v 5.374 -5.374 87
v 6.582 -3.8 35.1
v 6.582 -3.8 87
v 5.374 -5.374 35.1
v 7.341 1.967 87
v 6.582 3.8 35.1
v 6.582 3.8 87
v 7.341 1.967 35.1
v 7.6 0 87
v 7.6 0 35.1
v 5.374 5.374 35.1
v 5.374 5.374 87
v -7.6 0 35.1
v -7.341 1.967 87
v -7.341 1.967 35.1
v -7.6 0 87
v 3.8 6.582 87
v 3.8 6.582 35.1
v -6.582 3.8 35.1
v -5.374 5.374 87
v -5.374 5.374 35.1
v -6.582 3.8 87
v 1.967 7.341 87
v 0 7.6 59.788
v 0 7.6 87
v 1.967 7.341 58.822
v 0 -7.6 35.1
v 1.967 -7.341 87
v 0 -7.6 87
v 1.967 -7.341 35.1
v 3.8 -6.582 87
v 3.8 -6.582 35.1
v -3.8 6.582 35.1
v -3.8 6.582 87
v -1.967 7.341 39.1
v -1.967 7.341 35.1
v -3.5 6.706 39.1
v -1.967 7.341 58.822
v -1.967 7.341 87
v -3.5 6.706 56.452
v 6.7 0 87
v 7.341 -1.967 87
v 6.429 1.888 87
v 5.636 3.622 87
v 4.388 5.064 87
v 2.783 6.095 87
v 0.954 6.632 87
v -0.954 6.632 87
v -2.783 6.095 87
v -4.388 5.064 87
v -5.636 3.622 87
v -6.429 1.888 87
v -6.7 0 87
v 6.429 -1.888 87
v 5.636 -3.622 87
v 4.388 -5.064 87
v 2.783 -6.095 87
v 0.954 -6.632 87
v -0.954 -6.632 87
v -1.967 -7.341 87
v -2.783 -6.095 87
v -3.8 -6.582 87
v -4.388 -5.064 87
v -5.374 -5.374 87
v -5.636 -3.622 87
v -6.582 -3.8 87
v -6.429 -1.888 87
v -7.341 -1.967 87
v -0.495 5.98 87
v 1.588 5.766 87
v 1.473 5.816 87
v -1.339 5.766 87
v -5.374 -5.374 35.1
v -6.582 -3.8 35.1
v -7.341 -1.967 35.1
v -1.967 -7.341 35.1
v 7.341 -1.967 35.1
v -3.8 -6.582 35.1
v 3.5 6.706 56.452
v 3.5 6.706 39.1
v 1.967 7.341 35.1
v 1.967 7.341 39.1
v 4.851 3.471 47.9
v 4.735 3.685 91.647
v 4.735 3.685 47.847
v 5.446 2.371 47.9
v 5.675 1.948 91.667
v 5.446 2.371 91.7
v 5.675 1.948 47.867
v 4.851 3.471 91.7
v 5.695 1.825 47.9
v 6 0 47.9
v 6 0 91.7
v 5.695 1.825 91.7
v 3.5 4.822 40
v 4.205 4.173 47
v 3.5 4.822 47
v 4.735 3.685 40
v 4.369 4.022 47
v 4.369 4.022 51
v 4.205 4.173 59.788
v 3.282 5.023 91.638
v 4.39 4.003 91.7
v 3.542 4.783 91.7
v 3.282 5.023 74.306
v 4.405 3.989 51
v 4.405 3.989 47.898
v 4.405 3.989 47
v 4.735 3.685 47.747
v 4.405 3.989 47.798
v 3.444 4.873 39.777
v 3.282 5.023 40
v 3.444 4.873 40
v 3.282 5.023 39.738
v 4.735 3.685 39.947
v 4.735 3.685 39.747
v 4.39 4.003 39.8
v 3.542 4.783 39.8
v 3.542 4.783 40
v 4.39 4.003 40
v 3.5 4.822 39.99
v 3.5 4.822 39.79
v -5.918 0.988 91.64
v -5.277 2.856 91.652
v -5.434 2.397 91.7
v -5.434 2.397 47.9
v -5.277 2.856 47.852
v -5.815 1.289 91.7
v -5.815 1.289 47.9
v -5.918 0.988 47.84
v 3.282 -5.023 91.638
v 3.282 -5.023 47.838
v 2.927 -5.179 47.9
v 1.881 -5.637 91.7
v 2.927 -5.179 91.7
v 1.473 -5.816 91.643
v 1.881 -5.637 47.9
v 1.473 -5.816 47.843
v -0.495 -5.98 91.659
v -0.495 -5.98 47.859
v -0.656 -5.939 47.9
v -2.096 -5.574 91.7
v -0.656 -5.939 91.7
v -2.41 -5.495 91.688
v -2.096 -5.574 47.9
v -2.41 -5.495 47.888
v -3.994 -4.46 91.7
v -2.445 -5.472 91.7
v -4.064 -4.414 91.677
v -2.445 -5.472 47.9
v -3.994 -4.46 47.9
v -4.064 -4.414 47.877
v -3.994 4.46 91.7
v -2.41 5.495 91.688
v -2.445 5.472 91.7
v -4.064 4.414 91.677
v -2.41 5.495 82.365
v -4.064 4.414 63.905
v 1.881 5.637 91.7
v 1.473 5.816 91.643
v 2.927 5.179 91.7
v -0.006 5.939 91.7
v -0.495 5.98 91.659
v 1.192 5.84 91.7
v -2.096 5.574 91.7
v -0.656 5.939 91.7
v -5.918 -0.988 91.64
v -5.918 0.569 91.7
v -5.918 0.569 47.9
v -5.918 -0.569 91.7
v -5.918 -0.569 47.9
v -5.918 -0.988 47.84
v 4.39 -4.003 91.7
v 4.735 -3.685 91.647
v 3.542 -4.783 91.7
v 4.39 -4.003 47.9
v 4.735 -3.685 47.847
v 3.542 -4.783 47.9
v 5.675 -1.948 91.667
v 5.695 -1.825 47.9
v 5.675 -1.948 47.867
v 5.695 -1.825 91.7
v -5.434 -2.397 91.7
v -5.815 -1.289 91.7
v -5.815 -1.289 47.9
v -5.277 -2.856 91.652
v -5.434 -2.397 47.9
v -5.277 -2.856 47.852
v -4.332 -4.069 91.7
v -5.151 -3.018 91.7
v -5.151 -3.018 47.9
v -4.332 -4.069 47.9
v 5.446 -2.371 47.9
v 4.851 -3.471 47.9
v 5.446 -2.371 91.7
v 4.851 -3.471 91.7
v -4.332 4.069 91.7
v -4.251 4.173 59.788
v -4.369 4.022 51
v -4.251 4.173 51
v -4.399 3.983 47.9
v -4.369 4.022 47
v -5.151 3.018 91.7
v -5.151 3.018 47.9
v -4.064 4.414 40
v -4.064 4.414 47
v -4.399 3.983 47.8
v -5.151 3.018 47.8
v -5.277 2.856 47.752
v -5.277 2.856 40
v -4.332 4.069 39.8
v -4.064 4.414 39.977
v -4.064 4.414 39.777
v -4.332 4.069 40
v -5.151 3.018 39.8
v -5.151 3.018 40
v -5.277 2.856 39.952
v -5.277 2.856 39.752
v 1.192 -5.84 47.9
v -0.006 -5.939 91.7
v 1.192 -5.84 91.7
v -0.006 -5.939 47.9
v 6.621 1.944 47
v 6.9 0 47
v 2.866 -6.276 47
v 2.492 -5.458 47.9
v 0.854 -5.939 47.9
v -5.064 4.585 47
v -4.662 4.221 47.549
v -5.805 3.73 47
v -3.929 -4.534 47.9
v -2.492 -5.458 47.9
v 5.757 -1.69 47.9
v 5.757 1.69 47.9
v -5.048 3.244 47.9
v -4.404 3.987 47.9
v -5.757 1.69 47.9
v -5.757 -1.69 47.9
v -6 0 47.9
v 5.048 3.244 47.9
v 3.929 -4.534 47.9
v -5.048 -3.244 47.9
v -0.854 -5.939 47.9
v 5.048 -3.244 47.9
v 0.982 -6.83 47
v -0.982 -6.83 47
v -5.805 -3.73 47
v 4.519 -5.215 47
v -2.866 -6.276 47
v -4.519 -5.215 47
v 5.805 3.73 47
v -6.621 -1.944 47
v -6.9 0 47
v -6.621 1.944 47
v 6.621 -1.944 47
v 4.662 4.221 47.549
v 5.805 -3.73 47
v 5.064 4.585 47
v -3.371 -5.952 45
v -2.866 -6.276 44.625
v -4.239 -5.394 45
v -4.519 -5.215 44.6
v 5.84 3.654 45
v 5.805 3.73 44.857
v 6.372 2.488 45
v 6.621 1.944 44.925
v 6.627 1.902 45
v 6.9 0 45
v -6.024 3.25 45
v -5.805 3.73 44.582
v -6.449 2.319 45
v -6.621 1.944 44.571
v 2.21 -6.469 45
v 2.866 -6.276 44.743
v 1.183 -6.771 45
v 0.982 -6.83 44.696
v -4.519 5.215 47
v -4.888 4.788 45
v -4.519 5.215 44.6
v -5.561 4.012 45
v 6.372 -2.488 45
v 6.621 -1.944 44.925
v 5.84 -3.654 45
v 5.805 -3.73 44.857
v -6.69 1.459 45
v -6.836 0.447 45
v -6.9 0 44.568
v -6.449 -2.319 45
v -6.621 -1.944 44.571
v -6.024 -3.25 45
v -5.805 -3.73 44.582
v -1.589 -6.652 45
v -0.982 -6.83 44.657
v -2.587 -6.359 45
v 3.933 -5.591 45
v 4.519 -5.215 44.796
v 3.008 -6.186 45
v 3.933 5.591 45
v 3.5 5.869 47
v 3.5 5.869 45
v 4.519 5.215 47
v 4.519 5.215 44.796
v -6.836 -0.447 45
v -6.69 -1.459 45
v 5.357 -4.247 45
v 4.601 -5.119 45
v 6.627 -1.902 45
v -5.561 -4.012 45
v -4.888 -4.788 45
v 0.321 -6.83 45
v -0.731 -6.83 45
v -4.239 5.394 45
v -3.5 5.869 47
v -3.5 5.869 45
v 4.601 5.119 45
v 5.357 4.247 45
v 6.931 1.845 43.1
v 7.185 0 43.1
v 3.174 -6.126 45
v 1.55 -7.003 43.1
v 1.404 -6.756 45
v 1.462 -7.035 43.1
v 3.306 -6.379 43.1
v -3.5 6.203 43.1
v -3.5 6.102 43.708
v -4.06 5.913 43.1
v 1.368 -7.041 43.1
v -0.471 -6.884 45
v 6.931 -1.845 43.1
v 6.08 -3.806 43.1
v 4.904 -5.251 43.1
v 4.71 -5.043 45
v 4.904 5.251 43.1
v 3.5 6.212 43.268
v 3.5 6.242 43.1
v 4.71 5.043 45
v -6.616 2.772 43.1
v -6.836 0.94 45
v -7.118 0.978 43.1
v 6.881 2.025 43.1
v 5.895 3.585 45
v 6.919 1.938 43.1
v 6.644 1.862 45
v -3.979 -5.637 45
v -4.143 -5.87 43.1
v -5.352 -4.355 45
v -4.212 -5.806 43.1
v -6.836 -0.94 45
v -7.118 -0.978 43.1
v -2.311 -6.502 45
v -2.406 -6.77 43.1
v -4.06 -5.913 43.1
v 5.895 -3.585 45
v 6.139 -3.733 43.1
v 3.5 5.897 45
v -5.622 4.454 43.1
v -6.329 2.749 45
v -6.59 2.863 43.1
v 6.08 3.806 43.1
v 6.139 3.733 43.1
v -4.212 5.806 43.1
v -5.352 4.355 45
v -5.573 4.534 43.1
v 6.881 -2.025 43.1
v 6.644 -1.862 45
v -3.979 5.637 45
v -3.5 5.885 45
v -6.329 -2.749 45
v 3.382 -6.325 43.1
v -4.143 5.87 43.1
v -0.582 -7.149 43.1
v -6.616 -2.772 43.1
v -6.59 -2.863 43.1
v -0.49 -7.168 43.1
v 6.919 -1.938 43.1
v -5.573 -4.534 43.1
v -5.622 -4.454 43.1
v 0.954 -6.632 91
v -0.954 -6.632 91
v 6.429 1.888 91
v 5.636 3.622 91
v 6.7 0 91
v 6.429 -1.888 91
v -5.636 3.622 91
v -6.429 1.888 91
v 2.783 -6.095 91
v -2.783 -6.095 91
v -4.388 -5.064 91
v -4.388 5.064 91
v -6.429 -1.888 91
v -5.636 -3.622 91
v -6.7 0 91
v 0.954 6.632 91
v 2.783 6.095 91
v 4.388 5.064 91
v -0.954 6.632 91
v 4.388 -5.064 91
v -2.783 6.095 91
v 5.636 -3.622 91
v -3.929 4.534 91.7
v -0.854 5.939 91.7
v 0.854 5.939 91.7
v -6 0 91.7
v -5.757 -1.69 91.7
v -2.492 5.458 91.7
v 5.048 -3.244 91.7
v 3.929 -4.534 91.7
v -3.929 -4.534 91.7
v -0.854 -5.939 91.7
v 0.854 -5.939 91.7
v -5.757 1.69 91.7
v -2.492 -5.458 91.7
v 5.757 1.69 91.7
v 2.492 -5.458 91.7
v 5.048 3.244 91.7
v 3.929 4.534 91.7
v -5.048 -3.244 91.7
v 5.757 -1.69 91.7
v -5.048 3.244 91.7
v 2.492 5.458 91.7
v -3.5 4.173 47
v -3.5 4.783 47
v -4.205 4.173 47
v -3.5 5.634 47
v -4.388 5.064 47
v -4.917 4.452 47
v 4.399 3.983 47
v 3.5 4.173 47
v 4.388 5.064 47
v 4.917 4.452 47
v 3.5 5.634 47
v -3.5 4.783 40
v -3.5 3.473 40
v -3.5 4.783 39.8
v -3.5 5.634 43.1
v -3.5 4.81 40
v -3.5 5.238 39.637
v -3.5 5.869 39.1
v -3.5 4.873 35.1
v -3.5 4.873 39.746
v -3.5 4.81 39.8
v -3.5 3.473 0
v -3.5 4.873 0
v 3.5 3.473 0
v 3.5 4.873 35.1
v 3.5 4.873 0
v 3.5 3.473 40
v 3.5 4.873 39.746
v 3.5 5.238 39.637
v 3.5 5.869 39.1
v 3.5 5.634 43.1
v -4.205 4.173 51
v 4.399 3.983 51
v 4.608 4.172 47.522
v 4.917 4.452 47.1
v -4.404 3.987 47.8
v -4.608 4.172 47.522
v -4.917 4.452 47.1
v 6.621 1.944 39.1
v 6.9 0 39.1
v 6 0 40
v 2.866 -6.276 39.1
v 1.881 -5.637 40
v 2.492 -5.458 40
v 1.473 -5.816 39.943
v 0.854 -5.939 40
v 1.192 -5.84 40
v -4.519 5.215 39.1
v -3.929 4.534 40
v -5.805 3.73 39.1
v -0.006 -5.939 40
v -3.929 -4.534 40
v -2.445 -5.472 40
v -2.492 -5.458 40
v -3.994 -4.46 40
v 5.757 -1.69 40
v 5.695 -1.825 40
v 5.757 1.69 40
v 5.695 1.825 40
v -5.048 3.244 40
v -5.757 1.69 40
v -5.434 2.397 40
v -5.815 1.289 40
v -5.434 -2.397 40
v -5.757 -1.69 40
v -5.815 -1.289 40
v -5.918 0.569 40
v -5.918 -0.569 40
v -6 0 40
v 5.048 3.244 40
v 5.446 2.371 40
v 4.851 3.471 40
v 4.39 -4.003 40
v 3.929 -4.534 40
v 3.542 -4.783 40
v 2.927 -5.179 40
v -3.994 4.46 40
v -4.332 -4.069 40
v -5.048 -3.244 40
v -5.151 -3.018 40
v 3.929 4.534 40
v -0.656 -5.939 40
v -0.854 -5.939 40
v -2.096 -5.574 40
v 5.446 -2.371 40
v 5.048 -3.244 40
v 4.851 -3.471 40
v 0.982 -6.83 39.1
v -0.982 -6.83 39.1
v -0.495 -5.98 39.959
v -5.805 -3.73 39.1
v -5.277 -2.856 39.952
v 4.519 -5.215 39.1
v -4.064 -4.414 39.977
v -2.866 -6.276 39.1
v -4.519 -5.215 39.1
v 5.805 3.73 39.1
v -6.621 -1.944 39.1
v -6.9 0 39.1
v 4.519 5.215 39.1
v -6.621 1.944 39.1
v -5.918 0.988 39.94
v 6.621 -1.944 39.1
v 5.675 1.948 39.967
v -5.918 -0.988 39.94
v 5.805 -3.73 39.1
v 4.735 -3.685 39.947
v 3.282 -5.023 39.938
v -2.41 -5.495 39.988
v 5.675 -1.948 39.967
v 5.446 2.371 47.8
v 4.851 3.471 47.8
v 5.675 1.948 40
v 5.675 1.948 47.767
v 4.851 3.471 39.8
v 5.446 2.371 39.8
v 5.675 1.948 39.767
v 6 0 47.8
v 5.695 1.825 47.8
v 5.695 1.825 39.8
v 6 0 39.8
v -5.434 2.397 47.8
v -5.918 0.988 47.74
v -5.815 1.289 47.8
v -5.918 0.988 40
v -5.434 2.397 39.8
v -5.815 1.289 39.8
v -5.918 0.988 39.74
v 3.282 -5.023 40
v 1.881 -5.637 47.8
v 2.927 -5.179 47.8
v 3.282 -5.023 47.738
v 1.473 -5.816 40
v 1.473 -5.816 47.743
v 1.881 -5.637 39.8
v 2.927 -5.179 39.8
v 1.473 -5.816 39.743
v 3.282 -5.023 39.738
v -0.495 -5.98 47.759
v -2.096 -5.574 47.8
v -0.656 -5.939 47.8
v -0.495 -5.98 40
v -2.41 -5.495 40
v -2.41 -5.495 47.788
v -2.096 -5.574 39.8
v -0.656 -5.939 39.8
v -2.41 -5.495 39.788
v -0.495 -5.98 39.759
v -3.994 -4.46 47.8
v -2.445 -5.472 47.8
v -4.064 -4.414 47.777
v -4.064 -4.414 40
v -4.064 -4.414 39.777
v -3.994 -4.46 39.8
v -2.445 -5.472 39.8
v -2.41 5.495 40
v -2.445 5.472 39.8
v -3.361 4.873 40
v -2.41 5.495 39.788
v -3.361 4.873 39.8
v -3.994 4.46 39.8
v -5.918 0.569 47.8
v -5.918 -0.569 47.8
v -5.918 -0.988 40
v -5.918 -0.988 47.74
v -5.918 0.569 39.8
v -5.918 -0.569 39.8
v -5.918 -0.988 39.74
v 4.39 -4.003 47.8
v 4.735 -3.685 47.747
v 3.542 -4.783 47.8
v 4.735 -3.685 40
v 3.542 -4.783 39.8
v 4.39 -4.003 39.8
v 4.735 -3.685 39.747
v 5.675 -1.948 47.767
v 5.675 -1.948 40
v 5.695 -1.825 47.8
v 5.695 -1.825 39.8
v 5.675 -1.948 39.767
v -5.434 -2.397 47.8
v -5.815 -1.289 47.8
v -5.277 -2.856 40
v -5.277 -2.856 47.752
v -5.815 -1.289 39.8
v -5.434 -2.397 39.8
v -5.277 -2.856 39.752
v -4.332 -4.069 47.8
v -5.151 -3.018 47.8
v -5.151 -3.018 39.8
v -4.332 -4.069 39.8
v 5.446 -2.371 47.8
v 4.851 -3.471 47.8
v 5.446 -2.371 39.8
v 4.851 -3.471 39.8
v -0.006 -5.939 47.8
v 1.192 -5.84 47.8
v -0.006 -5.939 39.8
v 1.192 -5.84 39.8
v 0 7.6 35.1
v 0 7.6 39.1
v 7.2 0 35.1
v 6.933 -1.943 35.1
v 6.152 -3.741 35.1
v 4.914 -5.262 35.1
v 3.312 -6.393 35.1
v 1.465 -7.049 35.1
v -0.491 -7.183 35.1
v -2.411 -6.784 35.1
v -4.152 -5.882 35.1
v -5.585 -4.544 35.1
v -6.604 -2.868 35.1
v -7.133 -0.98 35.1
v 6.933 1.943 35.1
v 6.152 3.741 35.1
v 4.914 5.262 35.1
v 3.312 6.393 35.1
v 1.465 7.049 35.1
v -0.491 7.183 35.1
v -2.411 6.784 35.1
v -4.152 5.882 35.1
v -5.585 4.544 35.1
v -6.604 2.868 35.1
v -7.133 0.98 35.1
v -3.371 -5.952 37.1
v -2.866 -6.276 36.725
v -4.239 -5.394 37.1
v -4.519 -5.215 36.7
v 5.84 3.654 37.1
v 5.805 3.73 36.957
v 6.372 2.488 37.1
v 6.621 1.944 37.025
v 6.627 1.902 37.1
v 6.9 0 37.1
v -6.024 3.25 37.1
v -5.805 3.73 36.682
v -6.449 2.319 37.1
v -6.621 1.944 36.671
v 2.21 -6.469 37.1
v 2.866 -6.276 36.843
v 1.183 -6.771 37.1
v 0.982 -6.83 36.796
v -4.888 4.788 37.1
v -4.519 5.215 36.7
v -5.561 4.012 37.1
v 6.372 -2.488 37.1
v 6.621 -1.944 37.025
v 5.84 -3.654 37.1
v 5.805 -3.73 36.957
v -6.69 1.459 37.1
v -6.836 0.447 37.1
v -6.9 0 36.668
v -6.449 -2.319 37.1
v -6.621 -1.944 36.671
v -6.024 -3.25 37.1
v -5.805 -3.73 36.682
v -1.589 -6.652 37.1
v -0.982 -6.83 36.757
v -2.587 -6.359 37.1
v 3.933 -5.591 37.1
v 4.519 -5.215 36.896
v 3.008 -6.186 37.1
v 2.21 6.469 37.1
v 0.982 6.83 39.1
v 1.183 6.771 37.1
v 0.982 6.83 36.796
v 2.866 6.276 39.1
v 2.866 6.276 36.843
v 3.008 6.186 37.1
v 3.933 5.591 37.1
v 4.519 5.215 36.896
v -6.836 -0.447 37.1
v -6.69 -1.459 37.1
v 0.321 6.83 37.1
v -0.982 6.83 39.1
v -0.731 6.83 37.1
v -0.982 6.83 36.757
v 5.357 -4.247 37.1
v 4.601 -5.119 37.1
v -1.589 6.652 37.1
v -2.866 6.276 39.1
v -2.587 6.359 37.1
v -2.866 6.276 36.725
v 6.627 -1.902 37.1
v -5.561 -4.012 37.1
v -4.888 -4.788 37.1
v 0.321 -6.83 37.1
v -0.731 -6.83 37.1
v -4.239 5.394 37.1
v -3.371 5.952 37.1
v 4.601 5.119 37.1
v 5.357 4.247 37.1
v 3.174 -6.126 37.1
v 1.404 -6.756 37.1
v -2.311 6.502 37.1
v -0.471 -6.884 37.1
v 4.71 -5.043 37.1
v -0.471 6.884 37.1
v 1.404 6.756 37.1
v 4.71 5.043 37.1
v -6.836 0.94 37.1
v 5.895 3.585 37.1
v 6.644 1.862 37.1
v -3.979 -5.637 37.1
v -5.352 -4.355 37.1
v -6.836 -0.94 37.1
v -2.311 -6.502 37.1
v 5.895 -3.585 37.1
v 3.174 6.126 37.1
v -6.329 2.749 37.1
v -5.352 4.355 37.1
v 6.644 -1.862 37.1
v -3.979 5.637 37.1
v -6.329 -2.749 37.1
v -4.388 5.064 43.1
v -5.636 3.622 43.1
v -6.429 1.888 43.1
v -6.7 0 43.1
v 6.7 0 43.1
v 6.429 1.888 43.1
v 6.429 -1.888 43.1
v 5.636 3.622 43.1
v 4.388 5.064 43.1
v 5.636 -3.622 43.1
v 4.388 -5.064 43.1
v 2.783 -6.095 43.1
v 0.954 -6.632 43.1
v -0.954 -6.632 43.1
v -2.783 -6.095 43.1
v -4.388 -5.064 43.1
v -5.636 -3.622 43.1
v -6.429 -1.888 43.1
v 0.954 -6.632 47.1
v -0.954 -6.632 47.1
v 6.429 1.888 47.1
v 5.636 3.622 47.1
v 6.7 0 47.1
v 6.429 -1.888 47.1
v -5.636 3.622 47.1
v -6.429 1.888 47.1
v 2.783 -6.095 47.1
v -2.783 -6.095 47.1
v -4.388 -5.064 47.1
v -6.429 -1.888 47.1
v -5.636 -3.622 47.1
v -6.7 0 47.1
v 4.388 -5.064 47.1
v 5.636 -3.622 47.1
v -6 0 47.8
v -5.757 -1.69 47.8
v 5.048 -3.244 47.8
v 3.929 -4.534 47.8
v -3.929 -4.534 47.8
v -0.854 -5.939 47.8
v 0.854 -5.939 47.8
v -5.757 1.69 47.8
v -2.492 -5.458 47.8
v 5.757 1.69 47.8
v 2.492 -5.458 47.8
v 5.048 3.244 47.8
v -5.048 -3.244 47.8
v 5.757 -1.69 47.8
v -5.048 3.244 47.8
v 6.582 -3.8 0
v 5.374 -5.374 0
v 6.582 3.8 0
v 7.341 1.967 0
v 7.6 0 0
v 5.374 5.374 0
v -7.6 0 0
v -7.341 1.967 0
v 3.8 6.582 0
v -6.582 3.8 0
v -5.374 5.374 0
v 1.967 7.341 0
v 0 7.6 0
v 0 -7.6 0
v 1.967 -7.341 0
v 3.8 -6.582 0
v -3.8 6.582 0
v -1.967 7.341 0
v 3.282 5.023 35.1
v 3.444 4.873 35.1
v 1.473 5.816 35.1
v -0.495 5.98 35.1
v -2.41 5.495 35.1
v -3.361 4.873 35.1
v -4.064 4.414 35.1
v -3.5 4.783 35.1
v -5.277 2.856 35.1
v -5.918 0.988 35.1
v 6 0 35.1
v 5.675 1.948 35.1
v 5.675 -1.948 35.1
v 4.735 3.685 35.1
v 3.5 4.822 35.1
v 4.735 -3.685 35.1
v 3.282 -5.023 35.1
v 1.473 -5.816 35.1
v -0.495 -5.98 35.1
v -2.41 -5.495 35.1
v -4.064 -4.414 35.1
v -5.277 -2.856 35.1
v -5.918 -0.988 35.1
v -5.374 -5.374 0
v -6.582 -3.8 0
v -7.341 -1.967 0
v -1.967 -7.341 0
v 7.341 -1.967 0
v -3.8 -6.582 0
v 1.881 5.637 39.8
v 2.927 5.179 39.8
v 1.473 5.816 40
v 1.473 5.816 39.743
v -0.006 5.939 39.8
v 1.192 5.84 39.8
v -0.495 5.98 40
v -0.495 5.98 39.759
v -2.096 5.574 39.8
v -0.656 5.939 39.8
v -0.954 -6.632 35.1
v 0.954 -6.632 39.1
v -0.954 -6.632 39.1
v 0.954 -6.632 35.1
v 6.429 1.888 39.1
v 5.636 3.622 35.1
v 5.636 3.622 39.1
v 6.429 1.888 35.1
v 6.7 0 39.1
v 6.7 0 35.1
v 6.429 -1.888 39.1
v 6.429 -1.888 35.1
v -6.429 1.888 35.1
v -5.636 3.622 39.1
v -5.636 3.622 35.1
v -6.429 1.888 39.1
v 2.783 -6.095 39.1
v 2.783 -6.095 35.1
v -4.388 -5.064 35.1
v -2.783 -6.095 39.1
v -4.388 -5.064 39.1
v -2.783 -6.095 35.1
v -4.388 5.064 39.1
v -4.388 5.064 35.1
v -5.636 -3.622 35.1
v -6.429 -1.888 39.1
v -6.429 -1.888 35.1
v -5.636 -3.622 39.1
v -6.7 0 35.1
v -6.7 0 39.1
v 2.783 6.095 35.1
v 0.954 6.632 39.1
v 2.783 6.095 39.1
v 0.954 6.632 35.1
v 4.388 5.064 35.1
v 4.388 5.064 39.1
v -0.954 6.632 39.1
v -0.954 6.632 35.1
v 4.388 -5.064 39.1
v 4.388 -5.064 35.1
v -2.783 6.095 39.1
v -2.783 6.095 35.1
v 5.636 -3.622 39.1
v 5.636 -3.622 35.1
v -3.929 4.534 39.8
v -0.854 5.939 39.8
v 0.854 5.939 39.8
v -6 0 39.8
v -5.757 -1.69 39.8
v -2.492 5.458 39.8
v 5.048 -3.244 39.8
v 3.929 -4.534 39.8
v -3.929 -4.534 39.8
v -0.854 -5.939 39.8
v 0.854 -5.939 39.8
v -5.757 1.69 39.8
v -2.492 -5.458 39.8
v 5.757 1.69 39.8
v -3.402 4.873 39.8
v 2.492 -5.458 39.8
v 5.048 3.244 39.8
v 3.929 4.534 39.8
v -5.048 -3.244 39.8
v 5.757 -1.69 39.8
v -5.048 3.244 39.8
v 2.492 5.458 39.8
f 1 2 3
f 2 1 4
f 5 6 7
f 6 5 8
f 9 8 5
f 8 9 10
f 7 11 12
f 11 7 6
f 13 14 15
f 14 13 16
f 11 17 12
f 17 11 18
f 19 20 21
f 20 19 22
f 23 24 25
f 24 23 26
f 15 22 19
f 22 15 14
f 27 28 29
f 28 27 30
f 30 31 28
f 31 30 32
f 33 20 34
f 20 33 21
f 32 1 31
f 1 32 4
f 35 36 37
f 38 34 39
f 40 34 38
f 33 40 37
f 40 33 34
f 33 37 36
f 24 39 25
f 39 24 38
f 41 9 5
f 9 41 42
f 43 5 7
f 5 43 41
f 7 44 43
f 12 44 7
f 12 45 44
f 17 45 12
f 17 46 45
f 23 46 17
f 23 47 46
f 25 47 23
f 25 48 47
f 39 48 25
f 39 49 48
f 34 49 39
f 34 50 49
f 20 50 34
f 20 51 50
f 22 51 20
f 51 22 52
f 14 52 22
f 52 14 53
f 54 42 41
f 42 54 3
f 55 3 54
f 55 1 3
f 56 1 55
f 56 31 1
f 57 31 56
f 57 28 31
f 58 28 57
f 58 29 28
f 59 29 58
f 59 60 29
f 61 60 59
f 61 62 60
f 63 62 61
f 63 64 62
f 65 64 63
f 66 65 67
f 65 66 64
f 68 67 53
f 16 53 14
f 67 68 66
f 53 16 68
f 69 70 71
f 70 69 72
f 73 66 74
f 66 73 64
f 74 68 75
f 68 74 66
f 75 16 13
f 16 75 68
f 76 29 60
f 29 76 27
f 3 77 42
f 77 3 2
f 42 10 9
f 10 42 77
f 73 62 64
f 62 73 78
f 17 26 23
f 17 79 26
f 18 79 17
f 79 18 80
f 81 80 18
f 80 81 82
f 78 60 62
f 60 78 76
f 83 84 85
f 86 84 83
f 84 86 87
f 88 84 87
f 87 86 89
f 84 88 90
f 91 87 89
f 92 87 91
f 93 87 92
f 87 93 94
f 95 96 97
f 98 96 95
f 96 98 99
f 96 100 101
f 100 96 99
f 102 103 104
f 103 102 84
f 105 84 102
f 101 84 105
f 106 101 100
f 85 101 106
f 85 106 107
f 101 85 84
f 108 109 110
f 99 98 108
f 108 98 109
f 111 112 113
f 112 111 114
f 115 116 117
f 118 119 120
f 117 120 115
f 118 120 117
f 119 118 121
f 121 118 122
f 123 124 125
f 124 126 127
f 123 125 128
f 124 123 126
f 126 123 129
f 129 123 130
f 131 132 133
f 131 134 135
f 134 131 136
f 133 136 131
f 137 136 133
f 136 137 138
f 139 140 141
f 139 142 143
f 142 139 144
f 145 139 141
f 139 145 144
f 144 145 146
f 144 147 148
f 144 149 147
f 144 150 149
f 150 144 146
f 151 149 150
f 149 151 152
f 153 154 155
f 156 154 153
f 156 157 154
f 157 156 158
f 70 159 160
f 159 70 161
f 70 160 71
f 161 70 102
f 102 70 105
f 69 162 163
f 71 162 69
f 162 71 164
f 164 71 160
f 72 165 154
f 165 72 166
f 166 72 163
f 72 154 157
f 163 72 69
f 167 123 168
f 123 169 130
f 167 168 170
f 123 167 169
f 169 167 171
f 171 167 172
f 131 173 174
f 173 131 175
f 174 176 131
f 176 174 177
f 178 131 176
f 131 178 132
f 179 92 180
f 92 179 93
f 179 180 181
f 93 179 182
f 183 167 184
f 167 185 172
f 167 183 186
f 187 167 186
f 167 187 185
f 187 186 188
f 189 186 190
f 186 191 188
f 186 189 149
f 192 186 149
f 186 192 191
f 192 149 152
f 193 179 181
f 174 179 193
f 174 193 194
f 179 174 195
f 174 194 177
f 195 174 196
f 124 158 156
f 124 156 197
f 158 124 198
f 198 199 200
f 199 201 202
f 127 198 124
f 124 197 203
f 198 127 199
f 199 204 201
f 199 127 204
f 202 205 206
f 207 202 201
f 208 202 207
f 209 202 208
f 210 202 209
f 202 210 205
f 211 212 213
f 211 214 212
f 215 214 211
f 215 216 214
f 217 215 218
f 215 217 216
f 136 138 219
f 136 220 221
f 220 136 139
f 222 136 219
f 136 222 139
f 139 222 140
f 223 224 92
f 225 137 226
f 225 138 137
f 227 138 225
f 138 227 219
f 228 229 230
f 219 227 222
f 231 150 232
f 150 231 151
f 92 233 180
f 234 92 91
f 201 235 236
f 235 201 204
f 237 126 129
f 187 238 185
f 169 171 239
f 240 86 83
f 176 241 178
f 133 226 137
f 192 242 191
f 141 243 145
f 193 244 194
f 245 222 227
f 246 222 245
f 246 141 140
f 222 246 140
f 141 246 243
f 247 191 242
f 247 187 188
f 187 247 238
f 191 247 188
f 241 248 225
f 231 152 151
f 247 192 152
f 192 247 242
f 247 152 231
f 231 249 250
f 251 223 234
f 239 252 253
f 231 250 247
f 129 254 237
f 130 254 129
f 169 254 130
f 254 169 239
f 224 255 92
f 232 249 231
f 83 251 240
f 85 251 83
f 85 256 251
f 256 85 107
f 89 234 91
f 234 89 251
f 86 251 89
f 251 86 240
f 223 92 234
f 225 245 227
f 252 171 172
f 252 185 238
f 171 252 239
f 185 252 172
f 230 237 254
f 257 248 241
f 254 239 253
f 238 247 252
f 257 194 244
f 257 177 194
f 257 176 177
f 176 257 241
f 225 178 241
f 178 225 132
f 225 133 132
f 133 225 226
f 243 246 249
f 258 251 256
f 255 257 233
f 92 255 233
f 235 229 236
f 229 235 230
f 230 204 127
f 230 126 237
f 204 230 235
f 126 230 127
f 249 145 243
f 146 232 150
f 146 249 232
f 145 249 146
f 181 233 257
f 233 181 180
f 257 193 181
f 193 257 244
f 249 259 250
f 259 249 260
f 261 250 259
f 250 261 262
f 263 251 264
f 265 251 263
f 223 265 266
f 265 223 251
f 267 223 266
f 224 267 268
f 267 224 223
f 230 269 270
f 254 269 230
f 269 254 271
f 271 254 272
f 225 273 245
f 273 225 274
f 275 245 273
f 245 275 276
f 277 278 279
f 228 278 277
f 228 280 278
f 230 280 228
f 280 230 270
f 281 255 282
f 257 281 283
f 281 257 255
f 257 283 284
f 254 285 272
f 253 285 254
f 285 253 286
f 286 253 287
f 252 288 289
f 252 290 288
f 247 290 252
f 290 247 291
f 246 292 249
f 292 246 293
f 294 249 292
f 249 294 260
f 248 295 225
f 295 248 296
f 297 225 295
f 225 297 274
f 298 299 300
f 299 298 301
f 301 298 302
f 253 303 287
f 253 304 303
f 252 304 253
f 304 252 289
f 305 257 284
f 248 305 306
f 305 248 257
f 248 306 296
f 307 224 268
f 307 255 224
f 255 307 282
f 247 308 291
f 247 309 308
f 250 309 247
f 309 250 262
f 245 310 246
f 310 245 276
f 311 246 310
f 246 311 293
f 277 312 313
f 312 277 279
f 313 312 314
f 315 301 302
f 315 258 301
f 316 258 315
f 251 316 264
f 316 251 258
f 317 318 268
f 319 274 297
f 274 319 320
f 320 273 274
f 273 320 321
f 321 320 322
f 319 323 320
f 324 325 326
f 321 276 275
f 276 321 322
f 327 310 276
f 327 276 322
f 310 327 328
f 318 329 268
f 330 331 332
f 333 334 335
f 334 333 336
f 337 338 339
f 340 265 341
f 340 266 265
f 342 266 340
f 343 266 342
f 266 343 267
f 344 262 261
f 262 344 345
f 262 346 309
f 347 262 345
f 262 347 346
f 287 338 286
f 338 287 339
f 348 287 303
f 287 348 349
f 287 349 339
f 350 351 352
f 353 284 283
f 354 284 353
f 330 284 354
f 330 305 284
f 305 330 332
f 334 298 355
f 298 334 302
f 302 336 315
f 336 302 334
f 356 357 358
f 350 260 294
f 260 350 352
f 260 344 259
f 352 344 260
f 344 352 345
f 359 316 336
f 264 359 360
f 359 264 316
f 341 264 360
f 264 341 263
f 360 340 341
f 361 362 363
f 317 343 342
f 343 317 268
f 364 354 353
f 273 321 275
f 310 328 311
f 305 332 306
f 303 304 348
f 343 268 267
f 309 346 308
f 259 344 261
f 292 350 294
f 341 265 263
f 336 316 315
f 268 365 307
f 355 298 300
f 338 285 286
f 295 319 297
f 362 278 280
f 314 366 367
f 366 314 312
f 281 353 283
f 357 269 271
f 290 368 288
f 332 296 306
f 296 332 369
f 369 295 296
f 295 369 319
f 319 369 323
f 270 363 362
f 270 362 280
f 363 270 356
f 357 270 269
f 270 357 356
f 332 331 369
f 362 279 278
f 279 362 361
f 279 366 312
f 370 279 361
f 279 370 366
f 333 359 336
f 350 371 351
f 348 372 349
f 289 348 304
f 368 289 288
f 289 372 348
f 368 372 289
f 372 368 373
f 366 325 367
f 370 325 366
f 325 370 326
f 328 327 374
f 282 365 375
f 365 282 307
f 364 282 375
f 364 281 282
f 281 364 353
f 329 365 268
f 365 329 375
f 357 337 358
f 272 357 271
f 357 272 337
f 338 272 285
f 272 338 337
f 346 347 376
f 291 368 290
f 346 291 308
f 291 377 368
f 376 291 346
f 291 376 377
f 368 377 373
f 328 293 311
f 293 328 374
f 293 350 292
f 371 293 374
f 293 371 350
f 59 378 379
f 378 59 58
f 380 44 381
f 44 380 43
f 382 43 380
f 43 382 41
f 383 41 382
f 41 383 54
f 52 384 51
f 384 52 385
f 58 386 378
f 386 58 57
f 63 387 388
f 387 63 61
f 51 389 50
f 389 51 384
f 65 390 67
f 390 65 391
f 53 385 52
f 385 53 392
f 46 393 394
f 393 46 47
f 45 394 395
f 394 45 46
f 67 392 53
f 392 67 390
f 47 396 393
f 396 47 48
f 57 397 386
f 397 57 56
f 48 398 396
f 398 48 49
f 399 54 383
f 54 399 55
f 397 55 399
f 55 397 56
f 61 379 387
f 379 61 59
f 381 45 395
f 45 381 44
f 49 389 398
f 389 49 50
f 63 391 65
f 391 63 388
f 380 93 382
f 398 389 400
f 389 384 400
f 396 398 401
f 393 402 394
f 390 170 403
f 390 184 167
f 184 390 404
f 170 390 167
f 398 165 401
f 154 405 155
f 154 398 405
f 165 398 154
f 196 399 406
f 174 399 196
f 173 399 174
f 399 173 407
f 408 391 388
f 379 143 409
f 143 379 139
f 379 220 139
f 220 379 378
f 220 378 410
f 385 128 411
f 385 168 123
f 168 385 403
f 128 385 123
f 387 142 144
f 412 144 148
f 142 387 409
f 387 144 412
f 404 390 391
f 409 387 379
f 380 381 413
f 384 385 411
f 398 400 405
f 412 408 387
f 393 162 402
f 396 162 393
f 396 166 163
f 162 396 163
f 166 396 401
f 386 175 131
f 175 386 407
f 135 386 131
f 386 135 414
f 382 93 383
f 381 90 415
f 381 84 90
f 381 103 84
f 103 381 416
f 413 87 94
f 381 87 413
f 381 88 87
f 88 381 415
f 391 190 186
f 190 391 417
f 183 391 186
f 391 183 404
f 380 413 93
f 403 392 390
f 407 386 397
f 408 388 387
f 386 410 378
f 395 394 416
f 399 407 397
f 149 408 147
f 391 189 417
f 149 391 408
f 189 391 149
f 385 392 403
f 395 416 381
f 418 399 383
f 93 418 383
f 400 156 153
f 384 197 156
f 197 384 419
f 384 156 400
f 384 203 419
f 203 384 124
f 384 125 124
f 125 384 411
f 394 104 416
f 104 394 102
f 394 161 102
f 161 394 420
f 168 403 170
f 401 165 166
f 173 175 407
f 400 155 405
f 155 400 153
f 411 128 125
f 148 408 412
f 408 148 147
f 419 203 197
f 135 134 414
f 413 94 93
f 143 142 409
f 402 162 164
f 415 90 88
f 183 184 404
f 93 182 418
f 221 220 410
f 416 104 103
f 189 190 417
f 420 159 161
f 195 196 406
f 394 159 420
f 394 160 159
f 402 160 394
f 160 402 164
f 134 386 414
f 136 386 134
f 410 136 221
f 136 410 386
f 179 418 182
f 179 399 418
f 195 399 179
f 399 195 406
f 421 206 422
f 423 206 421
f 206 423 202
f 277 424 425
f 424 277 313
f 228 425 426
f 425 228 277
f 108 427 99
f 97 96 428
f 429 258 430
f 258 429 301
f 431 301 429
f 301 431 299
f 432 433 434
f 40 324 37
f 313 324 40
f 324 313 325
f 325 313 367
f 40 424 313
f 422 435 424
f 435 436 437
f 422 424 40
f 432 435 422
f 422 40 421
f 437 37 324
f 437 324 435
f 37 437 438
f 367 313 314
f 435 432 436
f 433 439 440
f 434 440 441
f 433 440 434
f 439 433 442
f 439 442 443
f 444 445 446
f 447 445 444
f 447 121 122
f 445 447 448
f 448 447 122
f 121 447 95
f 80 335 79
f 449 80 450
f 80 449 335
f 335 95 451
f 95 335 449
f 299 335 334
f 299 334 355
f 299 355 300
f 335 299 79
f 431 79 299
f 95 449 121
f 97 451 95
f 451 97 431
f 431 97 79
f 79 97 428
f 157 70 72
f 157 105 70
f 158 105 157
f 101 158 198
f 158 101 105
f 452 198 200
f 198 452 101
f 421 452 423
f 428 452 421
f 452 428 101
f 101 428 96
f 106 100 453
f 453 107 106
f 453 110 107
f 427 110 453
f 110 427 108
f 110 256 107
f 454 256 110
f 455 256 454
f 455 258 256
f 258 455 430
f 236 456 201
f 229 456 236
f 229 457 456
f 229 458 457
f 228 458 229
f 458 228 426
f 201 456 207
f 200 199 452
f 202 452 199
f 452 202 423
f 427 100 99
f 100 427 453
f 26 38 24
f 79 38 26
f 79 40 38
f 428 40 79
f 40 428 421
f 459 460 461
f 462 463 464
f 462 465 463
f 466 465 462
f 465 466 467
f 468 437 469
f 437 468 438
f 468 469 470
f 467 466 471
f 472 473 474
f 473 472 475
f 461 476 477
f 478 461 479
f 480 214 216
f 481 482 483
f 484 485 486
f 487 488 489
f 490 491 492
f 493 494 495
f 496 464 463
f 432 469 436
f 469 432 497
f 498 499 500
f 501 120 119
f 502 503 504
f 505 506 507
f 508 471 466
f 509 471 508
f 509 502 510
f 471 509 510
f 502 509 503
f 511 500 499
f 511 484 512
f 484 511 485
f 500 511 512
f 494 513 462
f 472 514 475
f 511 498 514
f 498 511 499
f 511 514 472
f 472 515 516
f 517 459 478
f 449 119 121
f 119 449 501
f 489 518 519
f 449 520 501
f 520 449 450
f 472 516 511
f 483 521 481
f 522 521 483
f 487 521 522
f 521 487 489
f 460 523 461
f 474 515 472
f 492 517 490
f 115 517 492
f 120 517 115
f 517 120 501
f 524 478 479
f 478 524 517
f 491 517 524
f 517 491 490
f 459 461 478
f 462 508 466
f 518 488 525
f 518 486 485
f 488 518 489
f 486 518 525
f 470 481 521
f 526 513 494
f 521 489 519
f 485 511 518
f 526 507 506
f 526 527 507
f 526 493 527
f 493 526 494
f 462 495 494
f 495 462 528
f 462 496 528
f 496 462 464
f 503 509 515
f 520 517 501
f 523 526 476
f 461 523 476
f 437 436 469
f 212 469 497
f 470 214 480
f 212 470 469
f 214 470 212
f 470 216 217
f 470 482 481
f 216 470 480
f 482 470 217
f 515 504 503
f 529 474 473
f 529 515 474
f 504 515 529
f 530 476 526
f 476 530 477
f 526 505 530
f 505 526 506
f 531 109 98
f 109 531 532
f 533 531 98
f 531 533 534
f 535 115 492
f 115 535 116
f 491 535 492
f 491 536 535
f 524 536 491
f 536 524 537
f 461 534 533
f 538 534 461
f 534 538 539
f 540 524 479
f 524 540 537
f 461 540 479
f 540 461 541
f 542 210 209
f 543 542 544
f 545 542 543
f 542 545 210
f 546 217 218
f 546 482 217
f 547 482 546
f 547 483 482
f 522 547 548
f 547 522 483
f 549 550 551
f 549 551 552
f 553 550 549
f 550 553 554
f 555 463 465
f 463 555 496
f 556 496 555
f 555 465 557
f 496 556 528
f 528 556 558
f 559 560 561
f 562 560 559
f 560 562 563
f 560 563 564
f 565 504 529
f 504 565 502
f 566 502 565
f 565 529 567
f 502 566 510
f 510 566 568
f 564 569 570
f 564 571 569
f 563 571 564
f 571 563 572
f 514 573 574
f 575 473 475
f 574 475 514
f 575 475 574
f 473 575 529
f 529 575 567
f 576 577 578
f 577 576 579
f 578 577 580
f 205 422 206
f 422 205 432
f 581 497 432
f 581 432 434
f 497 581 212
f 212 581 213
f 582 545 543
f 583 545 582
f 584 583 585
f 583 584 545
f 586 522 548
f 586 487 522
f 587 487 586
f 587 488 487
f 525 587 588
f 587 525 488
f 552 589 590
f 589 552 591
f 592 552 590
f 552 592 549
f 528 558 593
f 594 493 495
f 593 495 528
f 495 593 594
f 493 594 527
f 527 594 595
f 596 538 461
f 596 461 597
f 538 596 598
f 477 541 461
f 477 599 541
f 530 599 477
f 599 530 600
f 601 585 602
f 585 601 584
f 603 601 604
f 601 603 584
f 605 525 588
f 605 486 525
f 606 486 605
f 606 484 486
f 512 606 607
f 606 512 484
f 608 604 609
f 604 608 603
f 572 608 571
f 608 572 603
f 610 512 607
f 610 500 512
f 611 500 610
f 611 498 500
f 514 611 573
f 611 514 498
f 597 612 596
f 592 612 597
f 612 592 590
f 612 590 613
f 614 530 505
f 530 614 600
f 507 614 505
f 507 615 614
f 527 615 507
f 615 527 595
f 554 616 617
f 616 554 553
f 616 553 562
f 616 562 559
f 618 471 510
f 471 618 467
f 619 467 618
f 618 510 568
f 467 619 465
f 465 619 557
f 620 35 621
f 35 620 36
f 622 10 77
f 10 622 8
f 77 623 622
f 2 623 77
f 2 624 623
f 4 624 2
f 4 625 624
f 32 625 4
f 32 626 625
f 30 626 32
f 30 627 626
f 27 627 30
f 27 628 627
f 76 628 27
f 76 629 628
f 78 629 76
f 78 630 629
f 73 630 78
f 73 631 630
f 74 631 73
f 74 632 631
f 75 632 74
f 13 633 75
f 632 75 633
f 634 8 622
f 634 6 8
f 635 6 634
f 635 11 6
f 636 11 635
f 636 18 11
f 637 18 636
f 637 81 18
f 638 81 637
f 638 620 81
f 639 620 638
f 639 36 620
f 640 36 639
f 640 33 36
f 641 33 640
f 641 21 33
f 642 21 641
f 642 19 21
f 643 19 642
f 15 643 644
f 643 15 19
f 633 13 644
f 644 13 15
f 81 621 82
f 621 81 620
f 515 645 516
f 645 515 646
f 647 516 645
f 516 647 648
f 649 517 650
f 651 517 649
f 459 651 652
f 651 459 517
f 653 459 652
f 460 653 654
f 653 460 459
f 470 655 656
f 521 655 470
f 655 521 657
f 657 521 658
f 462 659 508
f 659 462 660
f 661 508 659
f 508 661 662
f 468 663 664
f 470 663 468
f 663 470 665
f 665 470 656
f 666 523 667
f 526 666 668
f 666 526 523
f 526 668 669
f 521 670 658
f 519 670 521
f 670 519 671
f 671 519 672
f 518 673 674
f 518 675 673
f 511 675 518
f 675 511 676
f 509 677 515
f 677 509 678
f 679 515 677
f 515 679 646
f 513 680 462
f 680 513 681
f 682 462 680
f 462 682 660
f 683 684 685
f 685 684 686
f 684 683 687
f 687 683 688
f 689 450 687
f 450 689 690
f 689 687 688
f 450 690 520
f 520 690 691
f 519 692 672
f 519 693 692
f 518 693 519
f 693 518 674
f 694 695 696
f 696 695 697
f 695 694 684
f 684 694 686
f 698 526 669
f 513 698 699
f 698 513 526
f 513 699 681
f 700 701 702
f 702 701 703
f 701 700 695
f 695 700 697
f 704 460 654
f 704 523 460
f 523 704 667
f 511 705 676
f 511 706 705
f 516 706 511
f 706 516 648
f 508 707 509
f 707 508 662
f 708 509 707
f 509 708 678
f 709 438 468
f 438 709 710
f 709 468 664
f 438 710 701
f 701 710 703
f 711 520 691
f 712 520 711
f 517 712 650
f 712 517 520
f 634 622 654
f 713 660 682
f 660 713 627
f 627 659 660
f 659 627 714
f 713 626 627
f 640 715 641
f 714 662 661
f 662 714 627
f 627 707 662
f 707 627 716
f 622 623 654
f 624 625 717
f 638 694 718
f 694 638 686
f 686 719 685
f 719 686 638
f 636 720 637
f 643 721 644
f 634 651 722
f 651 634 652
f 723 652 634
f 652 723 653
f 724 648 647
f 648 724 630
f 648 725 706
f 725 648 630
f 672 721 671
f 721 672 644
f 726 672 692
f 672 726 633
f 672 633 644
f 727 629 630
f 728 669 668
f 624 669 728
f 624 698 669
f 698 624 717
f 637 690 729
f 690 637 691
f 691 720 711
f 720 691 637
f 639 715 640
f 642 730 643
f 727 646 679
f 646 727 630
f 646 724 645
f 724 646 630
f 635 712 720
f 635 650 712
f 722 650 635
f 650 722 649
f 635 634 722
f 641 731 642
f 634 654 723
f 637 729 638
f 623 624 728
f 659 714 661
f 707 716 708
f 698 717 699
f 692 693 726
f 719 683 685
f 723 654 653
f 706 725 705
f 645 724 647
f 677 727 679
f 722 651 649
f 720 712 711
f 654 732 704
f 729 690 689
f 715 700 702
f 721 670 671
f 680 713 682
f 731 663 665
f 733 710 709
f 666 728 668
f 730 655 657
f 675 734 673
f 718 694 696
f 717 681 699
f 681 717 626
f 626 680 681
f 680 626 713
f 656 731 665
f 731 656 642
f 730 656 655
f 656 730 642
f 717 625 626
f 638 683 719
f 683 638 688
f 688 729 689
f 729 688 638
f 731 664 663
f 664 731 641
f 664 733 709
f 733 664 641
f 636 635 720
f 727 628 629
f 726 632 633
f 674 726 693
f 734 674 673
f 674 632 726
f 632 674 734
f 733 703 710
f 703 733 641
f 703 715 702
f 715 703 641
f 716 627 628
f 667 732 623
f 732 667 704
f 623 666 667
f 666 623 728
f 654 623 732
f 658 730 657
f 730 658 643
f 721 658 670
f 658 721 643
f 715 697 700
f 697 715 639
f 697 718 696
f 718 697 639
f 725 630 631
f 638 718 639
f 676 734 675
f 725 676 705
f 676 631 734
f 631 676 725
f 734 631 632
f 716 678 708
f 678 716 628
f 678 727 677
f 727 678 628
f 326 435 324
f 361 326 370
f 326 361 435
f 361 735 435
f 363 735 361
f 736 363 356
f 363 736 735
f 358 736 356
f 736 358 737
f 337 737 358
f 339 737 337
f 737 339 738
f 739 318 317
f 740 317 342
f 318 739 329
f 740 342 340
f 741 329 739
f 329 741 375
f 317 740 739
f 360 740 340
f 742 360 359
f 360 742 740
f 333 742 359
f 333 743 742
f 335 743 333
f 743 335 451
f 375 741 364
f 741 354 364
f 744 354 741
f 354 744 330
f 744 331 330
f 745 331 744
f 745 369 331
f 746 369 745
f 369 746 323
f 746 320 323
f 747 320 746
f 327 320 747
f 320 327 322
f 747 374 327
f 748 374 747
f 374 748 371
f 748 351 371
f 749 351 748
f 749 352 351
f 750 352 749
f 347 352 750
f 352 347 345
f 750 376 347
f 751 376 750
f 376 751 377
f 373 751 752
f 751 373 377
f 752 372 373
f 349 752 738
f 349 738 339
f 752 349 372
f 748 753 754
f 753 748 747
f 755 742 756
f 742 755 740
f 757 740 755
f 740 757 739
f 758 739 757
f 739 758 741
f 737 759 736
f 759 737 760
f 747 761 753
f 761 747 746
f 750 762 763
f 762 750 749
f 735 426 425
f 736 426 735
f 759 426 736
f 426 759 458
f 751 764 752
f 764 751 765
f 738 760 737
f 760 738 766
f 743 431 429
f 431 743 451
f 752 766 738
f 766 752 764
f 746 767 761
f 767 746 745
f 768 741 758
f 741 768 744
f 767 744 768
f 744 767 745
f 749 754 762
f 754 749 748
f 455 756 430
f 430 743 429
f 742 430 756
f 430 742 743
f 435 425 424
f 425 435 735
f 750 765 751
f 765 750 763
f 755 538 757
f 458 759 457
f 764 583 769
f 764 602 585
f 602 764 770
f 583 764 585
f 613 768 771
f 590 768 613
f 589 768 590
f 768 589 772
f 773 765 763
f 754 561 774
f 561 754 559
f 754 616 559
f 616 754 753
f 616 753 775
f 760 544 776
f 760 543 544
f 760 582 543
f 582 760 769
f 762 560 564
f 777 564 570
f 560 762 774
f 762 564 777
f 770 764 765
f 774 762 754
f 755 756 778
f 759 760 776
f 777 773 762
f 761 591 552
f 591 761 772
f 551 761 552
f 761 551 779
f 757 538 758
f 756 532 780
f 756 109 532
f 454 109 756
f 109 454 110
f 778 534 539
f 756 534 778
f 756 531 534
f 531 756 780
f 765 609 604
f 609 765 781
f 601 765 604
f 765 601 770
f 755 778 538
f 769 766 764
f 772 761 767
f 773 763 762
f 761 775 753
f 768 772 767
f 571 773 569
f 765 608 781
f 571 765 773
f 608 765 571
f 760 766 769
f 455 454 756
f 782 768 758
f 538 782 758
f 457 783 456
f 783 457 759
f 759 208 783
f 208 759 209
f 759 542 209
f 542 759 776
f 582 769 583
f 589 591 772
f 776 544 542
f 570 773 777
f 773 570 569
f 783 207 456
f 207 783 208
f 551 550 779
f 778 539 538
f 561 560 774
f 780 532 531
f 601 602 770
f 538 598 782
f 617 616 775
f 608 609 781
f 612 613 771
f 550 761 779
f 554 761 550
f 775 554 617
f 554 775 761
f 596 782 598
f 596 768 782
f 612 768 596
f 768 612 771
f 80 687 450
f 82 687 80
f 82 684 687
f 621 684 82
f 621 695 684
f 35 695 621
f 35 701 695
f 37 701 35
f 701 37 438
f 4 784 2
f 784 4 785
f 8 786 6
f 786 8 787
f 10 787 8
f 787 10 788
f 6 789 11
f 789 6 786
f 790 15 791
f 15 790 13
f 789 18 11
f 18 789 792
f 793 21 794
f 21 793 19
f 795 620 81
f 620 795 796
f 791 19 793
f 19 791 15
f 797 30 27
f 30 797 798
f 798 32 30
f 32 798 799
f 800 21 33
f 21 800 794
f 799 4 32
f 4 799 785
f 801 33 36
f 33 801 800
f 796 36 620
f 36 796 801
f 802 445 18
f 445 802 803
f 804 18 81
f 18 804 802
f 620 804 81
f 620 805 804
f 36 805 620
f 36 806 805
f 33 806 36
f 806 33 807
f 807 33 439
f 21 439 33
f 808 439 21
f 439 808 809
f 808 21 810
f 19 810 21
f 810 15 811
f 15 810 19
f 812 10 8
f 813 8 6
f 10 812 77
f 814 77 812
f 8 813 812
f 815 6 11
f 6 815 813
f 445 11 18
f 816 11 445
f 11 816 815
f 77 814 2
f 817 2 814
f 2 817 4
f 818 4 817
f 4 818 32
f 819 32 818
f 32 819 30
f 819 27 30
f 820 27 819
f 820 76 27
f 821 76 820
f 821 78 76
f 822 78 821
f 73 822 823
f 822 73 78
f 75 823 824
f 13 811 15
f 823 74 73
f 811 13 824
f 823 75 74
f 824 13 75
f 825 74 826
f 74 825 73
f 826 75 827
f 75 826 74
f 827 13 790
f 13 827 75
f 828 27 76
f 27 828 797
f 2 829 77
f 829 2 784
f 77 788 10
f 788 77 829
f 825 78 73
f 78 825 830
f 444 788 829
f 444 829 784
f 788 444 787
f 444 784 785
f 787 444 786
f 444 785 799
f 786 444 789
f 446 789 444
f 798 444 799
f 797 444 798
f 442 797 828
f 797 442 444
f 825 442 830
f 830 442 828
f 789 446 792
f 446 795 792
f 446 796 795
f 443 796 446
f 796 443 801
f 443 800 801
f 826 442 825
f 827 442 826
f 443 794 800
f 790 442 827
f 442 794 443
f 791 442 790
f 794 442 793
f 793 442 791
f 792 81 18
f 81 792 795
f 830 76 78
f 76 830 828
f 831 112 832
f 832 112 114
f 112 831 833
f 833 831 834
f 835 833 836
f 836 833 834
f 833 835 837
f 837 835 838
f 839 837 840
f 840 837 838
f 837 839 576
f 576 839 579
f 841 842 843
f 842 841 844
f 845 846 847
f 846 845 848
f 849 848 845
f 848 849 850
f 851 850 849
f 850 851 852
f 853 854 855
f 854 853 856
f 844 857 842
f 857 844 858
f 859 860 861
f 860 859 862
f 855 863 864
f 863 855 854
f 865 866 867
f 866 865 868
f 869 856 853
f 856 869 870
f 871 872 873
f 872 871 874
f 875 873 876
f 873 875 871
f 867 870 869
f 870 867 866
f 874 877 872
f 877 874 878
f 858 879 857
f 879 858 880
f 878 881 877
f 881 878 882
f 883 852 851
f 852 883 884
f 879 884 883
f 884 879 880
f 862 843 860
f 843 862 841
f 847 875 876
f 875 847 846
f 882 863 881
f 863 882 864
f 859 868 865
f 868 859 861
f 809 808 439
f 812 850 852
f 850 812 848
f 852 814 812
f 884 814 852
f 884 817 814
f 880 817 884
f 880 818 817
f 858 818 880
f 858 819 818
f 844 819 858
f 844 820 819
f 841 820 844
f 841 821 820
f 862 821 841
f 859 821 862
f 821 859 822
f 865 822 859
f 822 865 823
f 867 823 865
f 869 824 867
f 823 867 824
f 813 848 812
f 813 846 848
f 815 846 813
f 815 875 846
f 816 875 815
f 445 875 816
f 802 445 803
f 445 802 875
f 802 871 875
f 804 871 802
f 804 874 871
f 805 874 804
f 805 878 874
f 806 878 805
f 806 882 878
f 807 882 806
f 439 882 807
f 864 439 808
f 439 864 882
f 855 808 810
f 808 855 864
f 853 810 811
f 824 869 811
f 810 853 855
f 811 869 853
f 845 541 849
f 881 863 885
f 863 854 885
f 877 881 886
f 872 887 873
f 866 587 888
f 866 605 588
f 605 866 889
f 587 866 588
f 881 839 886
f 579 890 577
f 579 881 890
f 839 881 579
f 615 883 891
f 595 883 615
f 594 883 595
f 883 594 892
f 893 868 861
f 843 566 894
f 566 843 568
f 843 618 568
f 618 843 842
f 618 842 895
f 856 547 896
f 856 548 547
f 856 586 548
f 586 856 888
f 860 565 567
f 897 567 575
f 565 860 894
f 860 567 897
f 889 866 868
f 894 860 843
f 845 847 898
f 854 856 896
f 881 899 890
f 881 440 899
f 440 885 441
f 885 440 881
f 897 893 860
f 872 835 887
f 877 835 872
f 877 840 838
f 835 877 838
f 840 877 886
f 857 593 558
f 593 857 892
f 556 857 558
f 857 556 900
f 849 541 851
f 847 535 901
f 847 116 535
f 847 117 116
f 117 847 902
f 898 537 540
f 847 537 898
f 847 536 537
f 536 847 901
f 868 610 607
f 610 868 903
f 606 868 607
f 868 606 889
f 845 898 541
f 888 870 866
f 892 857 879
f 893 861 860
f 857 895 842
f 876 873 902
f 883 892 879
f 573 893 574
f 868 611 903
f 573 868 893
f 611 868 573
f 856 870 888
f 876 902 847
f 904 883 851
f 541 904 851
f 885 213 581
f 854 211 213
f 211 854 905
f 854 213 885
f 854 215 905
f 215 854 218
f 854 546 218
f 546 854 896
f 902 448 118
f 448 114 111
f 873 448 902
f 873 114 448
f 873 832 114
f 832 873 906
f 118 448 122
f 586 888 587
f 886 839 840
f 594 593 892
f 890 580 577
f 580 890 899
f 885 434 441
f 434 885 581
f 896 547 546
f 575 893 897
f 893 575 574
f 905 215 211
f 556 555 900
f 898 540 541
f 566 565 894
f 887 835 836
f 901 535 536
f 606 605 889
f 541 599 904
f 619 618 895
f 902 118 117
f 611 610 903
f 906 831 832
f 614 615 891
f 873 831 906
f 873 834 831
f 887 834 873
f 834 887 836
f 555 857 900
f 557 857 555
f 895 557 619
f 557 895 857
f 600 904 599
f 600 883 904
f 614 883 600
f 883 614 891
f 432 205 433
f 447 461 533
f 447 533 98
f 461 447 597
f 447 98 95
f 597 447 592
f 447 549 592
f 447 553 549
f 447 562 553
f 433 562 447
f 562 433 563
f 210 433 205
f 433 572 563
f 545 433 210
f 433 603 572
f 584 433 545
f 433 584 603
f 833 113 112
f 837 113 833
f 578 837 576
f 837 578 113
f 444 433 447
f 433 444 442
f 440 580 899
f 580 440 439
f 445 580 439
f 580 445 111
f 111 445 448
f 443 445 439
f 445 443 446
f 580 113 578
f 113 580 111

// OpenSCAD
// file: arc.scad
module sector(radius, height, start, end) {
  intersection() {
    cylinder(r=radius, h=height);
    rotate([0,0,start])
    rotate_extrude(angle=end-start) {
      square([radius,height]);
    }
  }
}

module arc(inner, outer, height, start, end) {
  difference(){
    sector(outer,height,start,end);
    sector(inner,height,0,360);
  }
}

arc(8,10,5,30,60);
// file: window.scad
use <coupler.scad>;
use <fipple.scad>;
use <mouthpiece.scad>;
use <segment.scad>;

module window(inner, outer, size, width, height) {
  echo(inner, outer, size, width, height);
  offset = inset(inner, width, height);
  difference() {
    segment(inner, outer, size);
    rotate([0,0,90])
      translate([offset-1, -width/2, 0])
        cube([outer-offset+1, width, size + coupler_height()]);
    translate([0,0,size+coupler_height()]) 
      cheek(inner, outer, width);
  }
}

window(6, 7.6, 4, 7, 1.4);
// file: segment.scad
use <coupler.scad>;
// Section

module pipe(inner, outer, length) {
  difference() {
    cylinder(r=outer, h=length);
    cylinder(r=inner, h=length);
  }
}

function bevel_height(inner, outer, gap=0.1) = (outer-inner)/2 + gap;

module bevel(inner, outer){
  w = (outer - inner);
  difference(){
    cylinder(r1=inner+w,r2=inner,h=w);
    cylinder(r=inner,h=w);
  }
}

module segment(inner, outer, length, gap=0.1) {
  w = (outer-inner)/2;
  union() {
    difference(){
      pipe(inner, outer, length);
      bevel(inner, outer+gap-w);
    }
    translate([0,0,-coupler_height()]) 
      coupler(inner, outer, false);
    translate([0,0,length + coupler_height()]) {
      coupler(inner, outer, true);
      bevel(inner, inner+w-gap);
    }
  }
}

module first_segment(inner, outer, length, gap=0.1) {
  w = (outer-inner)/2;
  union() {
    pipe(inner, outer, length);
    translate([0,0,length + coupler_height()]) {
      coupler(inner, outer, true);
      bevel(inner, inner+w-gap);
    }
  }
}

module last_segment(inner, outer, length, gap=0.1) {
  w = (outer-inner)/2;
  union() {
    difference(){
      pipe(inner, outer, length);
      bevel(inner, outer+gap-w);
    }
    translate([0,0,-coupler_height()]) 
      coupler(inner, outer, false);
  }
}

d = [4,6,2];

difference() {
  union() {
    first_segment(d.x, d.y, d.z);
    translate([0,0,d.z + coupler_height() + 0.1])
      segment(d.x, d.y, d.z);
    translate([0,0,2*(d.z + coupler_height() + 0.1)])
      last_segment(d.x, d.y, d.z);
  }
  translate([-20,0,0]) cube([50,50,50]);
}
// file: mouthpiece.scad
use <arc.scad>;
use <coupler.scad>;
use <fipple.scad>;
use <segment.scad>;

module mouthpiece(inner, outer, length, width, height,gap=0.1) {
  // bevel = (outer - inner) / 2 - gap;
  bevel = bevel_height(inner, outer, gap);
  excess = coupler_height() + bevel;
  length = length - excess;
  difference() {
    union() {
      first_segment(inner, outer, length);
      cylinder(r=inner, h=length + excess);
    }
    windway(inner, outer, length + excess, width, height);
  }
}

  /*
    / \    |
  r/   \   | h
  /__w__\  |

  s = (r+r+w)/2 = r + w/2
  A = sqrt(s(s-r)(s-r)(s-w))
    = sqrt( s (s-r)^2 (s-w) )
    = sqrt( (r+w/2) (r+w/2-r)^2 (r+w/2-w) )
    = sqrt( (r+w/2) (w/2)^2 (r-w/2) )
    = sqrt( (r^2 - (w/2)^2) (w/2)^2 )
    = (w/2) sqrt(r^2 - (w/2)^2)
  A = wh/2
  h = 2A/w
    = 2/w (w/2) sqrt(r^2 - (w/2)^2)
    = sqrt(r^2 - (w/2)^2)

  // to find w from h
  h2 = r2 - (w/2)2
  r2 - h2 = (w/2)2
  2sqrt(r2 - h2) = w
  */

function inset(inner, width, height) = -height + sqrt(pow(inner,2) - pow(width/2,2));

module windway(inner, outer, length, width, height) {
  offset = inset(inner, width, height);
  rotate([0,0,90]) 
    translate([offset, -width/2 ,0]) 
    cube([height, width, length]);
}
// file: fipple.scad
use <arc.scad>;
use <coupler.scad>;
use <mouthpiece.scad>;
use <segment.scad>;

function lip_radius (inner, width, height) = inset(inner, width, height) + height/2;
function lip_height (inner, outer, width, angle, height) = tan(angle) * (outer - inset(inner, width, height) - height/2);

module lip(inner, outer, width, angle, height) {
  w2 = width/2;
  r = lip_radius(inner, width, height);
  h = lip_height(inner, outer, width, angle, height);
  points = [
    [-w2,r,0],
    [w2,r,0],
    [-w2,outer,0],
    [w2,outer,0],
    [-w2,outer,h],
    [w2,outer,h]
  ];
  faces = [
    [0,1,3,2],
    [1,0,4,5],
    [2,3,5,4],
    [0,2,4],
    [1,5,3]
  ];
  polyhedron(points, faces);
}

module cheek(inner, outer, width) {
  angle = asin((width/2)/inner)/2;
  delta = 30;
  arc(inner, outer, coupler_height(), 90-angle-delta, 90+angle+delta);
}

module chin(inner, outer, length, width, angle, height) {
  r = lip_radius(inner, width, height);
  bottom_offset = max(coupler_height(), lip_height(inner, outer, width, angle, height));
  top_offset = length + coupler_height();
  w = inner-r;
  relief = atan2(-w,top_offset - bottom_offset);

  // 2sqrt(r2 - h2) = w
  w_at_lip = 2*sqrt(inner*inner - r*r);
  intersection() {
    cylinder(r=outer,h=length);
    translate([-w_at_lip/2,r,0]) {
      translate([0,0,bottom_offset]) 
        rotate([relief,0,0]) 
        cube([w_at_lip, outer-r, top_offset-bottom_offset]);
      cube([w_at_lip, outer-r, bottom_offset]);
    }
  }
}

module fipple(inner, outer, length, width, angle, height) {
  difference() {
    union() {
      difference() {
        segment(inner, outer, length);
        rotate([0,0,90])
          translate([0, -width/2, -coupler_height()])
          cube([outer, width, coupler_height()]);
      }
      chin(inner, outer, length, width, angle, height);
      cheek(inner, outer, width);
    }
    lip(inner, outer, width, angle, height);
  }
}

inner = 8;
outer = 10;
length = 40;
width = 5;
angle = 90-20;
height = 2;

fipple(inner, outer, length, width, angle, height);
// lip(inner, outer, width, angle, height);
// file: coupler.scad
use <segment.scad>;

function coupler_height () = 4;

// function gap = 0.4;
elephant_toe = 0.4;

module coupler(inner, outer, is_at_top, gap=0.1){
  h = coupler_height();
  w = (outer - inner) / 2;
  if (is_at_top) {
    translate([0,0,-h]) 
      pipe(inner, outer-w-gap, h);
  } else {
    difference() {
      pipe(inner+w+gap, outer, h);
      cylinder(r2=inner+w+gap, r1=outer-elephant_toe, h/2);
    }

  }
}

module offset_check(){
  intersection(){
    translate([0,-25,-25]) cube([50,50,50]);
    union(){
      segment(8,11,2);
      translate([0,0,2+coupler_height()+.1]) segment(8,11,2);
    }
  }
}

module coupler_tests() {
  // use comprehension to make vector of [gap, [dx, dy]] for one big stl
  gaps = [for (i=[0.0:0.05:0.2]) each [i,i]];
  r = 11;
  dr = r + 3;
  offsets = [for (x=[0:len(gaps)]) each [for (y=[0:1]) [dr*x,dr*y,0]]];
  for (i=[0:len(gaps)-1]) {
    // echo("i:", i, gaps[i], offsets[i]);
    translate(offsets[i]) segment(8/2,11/2,4,gaps[i]);
  }
}

// $fn=100;
// coupler_tests();
offset_check();
// segment(8,11,4,0.1);
// main file
use <coupler.scad>;
use <fipple.scad>;
use <mouthpiece.scad>;
use <segment.scad>;
use <window.scad>;

/* [ pipe ] */
inner_diameter = 12;
outer_diameter = 15;
length = 100;

/* [ fipple ] */
lip_width = 7;
lip_angle = 15;
window_size = 4;
windway_height = 1.4;
windway_length = 40;


/* measured whistle params

inner_diameter = 15.08;   // 19/32 = 15.08mm
outer_diameter = 15.87;   // 5/8 = 15.87mm
fipple_length = 71.46;    // 3 - 3/16
windway_length = 25.4;
window_size = 4.76;       // 3/16 = 4.76mm
width = 7.14;             // 9/32 = 7.14mm
angle = 20;
*/


module dummy(){}

// derived parameters
fipple_length = 40;
angle = 90 - lip_angle;
inner = inner_diameter / 2;
wall_thickness = ceil((outer_diameter / 2-inner)/0.4)*0.4; // whole number of nozzles
outer = inner + wall_thickness;

w = lip_width;
w_sz = window_size;
w_h = windway_height;
w_len = windway_length;
f_len = fipple_length;
p_len = length - f_len;
b_h = bevel_height(inner, outer);

module last() {
  last_segment(inner, outer, p_len);
}

module non_last() {
  segment(inner, outer, p_len);
}

module fip() {
  fipple(inner, outer, f_len, w, angle, w_h);
}

module win() {
  window(inner, outer, w_sz, w, w_h);
}

module mouth() {
  mouthpiece(inner, outer, w_len, w, w_h);
}

module test() {
  c = coupler_height();

  // translate([0, 0, p_len + f_len + w_len + w_sz + 7*c + 4])
  //   last();

  // translate([0, 0, f_len + w_len + w_sz + 5*c + 3])
  //   non_last();

  translate([0, 0, w_len + w_sz + 3])
    fip();

  color("#aaaaaa55") translate([0, 0, w_len - b_h ])
    win();

  mouth();
}

test();
